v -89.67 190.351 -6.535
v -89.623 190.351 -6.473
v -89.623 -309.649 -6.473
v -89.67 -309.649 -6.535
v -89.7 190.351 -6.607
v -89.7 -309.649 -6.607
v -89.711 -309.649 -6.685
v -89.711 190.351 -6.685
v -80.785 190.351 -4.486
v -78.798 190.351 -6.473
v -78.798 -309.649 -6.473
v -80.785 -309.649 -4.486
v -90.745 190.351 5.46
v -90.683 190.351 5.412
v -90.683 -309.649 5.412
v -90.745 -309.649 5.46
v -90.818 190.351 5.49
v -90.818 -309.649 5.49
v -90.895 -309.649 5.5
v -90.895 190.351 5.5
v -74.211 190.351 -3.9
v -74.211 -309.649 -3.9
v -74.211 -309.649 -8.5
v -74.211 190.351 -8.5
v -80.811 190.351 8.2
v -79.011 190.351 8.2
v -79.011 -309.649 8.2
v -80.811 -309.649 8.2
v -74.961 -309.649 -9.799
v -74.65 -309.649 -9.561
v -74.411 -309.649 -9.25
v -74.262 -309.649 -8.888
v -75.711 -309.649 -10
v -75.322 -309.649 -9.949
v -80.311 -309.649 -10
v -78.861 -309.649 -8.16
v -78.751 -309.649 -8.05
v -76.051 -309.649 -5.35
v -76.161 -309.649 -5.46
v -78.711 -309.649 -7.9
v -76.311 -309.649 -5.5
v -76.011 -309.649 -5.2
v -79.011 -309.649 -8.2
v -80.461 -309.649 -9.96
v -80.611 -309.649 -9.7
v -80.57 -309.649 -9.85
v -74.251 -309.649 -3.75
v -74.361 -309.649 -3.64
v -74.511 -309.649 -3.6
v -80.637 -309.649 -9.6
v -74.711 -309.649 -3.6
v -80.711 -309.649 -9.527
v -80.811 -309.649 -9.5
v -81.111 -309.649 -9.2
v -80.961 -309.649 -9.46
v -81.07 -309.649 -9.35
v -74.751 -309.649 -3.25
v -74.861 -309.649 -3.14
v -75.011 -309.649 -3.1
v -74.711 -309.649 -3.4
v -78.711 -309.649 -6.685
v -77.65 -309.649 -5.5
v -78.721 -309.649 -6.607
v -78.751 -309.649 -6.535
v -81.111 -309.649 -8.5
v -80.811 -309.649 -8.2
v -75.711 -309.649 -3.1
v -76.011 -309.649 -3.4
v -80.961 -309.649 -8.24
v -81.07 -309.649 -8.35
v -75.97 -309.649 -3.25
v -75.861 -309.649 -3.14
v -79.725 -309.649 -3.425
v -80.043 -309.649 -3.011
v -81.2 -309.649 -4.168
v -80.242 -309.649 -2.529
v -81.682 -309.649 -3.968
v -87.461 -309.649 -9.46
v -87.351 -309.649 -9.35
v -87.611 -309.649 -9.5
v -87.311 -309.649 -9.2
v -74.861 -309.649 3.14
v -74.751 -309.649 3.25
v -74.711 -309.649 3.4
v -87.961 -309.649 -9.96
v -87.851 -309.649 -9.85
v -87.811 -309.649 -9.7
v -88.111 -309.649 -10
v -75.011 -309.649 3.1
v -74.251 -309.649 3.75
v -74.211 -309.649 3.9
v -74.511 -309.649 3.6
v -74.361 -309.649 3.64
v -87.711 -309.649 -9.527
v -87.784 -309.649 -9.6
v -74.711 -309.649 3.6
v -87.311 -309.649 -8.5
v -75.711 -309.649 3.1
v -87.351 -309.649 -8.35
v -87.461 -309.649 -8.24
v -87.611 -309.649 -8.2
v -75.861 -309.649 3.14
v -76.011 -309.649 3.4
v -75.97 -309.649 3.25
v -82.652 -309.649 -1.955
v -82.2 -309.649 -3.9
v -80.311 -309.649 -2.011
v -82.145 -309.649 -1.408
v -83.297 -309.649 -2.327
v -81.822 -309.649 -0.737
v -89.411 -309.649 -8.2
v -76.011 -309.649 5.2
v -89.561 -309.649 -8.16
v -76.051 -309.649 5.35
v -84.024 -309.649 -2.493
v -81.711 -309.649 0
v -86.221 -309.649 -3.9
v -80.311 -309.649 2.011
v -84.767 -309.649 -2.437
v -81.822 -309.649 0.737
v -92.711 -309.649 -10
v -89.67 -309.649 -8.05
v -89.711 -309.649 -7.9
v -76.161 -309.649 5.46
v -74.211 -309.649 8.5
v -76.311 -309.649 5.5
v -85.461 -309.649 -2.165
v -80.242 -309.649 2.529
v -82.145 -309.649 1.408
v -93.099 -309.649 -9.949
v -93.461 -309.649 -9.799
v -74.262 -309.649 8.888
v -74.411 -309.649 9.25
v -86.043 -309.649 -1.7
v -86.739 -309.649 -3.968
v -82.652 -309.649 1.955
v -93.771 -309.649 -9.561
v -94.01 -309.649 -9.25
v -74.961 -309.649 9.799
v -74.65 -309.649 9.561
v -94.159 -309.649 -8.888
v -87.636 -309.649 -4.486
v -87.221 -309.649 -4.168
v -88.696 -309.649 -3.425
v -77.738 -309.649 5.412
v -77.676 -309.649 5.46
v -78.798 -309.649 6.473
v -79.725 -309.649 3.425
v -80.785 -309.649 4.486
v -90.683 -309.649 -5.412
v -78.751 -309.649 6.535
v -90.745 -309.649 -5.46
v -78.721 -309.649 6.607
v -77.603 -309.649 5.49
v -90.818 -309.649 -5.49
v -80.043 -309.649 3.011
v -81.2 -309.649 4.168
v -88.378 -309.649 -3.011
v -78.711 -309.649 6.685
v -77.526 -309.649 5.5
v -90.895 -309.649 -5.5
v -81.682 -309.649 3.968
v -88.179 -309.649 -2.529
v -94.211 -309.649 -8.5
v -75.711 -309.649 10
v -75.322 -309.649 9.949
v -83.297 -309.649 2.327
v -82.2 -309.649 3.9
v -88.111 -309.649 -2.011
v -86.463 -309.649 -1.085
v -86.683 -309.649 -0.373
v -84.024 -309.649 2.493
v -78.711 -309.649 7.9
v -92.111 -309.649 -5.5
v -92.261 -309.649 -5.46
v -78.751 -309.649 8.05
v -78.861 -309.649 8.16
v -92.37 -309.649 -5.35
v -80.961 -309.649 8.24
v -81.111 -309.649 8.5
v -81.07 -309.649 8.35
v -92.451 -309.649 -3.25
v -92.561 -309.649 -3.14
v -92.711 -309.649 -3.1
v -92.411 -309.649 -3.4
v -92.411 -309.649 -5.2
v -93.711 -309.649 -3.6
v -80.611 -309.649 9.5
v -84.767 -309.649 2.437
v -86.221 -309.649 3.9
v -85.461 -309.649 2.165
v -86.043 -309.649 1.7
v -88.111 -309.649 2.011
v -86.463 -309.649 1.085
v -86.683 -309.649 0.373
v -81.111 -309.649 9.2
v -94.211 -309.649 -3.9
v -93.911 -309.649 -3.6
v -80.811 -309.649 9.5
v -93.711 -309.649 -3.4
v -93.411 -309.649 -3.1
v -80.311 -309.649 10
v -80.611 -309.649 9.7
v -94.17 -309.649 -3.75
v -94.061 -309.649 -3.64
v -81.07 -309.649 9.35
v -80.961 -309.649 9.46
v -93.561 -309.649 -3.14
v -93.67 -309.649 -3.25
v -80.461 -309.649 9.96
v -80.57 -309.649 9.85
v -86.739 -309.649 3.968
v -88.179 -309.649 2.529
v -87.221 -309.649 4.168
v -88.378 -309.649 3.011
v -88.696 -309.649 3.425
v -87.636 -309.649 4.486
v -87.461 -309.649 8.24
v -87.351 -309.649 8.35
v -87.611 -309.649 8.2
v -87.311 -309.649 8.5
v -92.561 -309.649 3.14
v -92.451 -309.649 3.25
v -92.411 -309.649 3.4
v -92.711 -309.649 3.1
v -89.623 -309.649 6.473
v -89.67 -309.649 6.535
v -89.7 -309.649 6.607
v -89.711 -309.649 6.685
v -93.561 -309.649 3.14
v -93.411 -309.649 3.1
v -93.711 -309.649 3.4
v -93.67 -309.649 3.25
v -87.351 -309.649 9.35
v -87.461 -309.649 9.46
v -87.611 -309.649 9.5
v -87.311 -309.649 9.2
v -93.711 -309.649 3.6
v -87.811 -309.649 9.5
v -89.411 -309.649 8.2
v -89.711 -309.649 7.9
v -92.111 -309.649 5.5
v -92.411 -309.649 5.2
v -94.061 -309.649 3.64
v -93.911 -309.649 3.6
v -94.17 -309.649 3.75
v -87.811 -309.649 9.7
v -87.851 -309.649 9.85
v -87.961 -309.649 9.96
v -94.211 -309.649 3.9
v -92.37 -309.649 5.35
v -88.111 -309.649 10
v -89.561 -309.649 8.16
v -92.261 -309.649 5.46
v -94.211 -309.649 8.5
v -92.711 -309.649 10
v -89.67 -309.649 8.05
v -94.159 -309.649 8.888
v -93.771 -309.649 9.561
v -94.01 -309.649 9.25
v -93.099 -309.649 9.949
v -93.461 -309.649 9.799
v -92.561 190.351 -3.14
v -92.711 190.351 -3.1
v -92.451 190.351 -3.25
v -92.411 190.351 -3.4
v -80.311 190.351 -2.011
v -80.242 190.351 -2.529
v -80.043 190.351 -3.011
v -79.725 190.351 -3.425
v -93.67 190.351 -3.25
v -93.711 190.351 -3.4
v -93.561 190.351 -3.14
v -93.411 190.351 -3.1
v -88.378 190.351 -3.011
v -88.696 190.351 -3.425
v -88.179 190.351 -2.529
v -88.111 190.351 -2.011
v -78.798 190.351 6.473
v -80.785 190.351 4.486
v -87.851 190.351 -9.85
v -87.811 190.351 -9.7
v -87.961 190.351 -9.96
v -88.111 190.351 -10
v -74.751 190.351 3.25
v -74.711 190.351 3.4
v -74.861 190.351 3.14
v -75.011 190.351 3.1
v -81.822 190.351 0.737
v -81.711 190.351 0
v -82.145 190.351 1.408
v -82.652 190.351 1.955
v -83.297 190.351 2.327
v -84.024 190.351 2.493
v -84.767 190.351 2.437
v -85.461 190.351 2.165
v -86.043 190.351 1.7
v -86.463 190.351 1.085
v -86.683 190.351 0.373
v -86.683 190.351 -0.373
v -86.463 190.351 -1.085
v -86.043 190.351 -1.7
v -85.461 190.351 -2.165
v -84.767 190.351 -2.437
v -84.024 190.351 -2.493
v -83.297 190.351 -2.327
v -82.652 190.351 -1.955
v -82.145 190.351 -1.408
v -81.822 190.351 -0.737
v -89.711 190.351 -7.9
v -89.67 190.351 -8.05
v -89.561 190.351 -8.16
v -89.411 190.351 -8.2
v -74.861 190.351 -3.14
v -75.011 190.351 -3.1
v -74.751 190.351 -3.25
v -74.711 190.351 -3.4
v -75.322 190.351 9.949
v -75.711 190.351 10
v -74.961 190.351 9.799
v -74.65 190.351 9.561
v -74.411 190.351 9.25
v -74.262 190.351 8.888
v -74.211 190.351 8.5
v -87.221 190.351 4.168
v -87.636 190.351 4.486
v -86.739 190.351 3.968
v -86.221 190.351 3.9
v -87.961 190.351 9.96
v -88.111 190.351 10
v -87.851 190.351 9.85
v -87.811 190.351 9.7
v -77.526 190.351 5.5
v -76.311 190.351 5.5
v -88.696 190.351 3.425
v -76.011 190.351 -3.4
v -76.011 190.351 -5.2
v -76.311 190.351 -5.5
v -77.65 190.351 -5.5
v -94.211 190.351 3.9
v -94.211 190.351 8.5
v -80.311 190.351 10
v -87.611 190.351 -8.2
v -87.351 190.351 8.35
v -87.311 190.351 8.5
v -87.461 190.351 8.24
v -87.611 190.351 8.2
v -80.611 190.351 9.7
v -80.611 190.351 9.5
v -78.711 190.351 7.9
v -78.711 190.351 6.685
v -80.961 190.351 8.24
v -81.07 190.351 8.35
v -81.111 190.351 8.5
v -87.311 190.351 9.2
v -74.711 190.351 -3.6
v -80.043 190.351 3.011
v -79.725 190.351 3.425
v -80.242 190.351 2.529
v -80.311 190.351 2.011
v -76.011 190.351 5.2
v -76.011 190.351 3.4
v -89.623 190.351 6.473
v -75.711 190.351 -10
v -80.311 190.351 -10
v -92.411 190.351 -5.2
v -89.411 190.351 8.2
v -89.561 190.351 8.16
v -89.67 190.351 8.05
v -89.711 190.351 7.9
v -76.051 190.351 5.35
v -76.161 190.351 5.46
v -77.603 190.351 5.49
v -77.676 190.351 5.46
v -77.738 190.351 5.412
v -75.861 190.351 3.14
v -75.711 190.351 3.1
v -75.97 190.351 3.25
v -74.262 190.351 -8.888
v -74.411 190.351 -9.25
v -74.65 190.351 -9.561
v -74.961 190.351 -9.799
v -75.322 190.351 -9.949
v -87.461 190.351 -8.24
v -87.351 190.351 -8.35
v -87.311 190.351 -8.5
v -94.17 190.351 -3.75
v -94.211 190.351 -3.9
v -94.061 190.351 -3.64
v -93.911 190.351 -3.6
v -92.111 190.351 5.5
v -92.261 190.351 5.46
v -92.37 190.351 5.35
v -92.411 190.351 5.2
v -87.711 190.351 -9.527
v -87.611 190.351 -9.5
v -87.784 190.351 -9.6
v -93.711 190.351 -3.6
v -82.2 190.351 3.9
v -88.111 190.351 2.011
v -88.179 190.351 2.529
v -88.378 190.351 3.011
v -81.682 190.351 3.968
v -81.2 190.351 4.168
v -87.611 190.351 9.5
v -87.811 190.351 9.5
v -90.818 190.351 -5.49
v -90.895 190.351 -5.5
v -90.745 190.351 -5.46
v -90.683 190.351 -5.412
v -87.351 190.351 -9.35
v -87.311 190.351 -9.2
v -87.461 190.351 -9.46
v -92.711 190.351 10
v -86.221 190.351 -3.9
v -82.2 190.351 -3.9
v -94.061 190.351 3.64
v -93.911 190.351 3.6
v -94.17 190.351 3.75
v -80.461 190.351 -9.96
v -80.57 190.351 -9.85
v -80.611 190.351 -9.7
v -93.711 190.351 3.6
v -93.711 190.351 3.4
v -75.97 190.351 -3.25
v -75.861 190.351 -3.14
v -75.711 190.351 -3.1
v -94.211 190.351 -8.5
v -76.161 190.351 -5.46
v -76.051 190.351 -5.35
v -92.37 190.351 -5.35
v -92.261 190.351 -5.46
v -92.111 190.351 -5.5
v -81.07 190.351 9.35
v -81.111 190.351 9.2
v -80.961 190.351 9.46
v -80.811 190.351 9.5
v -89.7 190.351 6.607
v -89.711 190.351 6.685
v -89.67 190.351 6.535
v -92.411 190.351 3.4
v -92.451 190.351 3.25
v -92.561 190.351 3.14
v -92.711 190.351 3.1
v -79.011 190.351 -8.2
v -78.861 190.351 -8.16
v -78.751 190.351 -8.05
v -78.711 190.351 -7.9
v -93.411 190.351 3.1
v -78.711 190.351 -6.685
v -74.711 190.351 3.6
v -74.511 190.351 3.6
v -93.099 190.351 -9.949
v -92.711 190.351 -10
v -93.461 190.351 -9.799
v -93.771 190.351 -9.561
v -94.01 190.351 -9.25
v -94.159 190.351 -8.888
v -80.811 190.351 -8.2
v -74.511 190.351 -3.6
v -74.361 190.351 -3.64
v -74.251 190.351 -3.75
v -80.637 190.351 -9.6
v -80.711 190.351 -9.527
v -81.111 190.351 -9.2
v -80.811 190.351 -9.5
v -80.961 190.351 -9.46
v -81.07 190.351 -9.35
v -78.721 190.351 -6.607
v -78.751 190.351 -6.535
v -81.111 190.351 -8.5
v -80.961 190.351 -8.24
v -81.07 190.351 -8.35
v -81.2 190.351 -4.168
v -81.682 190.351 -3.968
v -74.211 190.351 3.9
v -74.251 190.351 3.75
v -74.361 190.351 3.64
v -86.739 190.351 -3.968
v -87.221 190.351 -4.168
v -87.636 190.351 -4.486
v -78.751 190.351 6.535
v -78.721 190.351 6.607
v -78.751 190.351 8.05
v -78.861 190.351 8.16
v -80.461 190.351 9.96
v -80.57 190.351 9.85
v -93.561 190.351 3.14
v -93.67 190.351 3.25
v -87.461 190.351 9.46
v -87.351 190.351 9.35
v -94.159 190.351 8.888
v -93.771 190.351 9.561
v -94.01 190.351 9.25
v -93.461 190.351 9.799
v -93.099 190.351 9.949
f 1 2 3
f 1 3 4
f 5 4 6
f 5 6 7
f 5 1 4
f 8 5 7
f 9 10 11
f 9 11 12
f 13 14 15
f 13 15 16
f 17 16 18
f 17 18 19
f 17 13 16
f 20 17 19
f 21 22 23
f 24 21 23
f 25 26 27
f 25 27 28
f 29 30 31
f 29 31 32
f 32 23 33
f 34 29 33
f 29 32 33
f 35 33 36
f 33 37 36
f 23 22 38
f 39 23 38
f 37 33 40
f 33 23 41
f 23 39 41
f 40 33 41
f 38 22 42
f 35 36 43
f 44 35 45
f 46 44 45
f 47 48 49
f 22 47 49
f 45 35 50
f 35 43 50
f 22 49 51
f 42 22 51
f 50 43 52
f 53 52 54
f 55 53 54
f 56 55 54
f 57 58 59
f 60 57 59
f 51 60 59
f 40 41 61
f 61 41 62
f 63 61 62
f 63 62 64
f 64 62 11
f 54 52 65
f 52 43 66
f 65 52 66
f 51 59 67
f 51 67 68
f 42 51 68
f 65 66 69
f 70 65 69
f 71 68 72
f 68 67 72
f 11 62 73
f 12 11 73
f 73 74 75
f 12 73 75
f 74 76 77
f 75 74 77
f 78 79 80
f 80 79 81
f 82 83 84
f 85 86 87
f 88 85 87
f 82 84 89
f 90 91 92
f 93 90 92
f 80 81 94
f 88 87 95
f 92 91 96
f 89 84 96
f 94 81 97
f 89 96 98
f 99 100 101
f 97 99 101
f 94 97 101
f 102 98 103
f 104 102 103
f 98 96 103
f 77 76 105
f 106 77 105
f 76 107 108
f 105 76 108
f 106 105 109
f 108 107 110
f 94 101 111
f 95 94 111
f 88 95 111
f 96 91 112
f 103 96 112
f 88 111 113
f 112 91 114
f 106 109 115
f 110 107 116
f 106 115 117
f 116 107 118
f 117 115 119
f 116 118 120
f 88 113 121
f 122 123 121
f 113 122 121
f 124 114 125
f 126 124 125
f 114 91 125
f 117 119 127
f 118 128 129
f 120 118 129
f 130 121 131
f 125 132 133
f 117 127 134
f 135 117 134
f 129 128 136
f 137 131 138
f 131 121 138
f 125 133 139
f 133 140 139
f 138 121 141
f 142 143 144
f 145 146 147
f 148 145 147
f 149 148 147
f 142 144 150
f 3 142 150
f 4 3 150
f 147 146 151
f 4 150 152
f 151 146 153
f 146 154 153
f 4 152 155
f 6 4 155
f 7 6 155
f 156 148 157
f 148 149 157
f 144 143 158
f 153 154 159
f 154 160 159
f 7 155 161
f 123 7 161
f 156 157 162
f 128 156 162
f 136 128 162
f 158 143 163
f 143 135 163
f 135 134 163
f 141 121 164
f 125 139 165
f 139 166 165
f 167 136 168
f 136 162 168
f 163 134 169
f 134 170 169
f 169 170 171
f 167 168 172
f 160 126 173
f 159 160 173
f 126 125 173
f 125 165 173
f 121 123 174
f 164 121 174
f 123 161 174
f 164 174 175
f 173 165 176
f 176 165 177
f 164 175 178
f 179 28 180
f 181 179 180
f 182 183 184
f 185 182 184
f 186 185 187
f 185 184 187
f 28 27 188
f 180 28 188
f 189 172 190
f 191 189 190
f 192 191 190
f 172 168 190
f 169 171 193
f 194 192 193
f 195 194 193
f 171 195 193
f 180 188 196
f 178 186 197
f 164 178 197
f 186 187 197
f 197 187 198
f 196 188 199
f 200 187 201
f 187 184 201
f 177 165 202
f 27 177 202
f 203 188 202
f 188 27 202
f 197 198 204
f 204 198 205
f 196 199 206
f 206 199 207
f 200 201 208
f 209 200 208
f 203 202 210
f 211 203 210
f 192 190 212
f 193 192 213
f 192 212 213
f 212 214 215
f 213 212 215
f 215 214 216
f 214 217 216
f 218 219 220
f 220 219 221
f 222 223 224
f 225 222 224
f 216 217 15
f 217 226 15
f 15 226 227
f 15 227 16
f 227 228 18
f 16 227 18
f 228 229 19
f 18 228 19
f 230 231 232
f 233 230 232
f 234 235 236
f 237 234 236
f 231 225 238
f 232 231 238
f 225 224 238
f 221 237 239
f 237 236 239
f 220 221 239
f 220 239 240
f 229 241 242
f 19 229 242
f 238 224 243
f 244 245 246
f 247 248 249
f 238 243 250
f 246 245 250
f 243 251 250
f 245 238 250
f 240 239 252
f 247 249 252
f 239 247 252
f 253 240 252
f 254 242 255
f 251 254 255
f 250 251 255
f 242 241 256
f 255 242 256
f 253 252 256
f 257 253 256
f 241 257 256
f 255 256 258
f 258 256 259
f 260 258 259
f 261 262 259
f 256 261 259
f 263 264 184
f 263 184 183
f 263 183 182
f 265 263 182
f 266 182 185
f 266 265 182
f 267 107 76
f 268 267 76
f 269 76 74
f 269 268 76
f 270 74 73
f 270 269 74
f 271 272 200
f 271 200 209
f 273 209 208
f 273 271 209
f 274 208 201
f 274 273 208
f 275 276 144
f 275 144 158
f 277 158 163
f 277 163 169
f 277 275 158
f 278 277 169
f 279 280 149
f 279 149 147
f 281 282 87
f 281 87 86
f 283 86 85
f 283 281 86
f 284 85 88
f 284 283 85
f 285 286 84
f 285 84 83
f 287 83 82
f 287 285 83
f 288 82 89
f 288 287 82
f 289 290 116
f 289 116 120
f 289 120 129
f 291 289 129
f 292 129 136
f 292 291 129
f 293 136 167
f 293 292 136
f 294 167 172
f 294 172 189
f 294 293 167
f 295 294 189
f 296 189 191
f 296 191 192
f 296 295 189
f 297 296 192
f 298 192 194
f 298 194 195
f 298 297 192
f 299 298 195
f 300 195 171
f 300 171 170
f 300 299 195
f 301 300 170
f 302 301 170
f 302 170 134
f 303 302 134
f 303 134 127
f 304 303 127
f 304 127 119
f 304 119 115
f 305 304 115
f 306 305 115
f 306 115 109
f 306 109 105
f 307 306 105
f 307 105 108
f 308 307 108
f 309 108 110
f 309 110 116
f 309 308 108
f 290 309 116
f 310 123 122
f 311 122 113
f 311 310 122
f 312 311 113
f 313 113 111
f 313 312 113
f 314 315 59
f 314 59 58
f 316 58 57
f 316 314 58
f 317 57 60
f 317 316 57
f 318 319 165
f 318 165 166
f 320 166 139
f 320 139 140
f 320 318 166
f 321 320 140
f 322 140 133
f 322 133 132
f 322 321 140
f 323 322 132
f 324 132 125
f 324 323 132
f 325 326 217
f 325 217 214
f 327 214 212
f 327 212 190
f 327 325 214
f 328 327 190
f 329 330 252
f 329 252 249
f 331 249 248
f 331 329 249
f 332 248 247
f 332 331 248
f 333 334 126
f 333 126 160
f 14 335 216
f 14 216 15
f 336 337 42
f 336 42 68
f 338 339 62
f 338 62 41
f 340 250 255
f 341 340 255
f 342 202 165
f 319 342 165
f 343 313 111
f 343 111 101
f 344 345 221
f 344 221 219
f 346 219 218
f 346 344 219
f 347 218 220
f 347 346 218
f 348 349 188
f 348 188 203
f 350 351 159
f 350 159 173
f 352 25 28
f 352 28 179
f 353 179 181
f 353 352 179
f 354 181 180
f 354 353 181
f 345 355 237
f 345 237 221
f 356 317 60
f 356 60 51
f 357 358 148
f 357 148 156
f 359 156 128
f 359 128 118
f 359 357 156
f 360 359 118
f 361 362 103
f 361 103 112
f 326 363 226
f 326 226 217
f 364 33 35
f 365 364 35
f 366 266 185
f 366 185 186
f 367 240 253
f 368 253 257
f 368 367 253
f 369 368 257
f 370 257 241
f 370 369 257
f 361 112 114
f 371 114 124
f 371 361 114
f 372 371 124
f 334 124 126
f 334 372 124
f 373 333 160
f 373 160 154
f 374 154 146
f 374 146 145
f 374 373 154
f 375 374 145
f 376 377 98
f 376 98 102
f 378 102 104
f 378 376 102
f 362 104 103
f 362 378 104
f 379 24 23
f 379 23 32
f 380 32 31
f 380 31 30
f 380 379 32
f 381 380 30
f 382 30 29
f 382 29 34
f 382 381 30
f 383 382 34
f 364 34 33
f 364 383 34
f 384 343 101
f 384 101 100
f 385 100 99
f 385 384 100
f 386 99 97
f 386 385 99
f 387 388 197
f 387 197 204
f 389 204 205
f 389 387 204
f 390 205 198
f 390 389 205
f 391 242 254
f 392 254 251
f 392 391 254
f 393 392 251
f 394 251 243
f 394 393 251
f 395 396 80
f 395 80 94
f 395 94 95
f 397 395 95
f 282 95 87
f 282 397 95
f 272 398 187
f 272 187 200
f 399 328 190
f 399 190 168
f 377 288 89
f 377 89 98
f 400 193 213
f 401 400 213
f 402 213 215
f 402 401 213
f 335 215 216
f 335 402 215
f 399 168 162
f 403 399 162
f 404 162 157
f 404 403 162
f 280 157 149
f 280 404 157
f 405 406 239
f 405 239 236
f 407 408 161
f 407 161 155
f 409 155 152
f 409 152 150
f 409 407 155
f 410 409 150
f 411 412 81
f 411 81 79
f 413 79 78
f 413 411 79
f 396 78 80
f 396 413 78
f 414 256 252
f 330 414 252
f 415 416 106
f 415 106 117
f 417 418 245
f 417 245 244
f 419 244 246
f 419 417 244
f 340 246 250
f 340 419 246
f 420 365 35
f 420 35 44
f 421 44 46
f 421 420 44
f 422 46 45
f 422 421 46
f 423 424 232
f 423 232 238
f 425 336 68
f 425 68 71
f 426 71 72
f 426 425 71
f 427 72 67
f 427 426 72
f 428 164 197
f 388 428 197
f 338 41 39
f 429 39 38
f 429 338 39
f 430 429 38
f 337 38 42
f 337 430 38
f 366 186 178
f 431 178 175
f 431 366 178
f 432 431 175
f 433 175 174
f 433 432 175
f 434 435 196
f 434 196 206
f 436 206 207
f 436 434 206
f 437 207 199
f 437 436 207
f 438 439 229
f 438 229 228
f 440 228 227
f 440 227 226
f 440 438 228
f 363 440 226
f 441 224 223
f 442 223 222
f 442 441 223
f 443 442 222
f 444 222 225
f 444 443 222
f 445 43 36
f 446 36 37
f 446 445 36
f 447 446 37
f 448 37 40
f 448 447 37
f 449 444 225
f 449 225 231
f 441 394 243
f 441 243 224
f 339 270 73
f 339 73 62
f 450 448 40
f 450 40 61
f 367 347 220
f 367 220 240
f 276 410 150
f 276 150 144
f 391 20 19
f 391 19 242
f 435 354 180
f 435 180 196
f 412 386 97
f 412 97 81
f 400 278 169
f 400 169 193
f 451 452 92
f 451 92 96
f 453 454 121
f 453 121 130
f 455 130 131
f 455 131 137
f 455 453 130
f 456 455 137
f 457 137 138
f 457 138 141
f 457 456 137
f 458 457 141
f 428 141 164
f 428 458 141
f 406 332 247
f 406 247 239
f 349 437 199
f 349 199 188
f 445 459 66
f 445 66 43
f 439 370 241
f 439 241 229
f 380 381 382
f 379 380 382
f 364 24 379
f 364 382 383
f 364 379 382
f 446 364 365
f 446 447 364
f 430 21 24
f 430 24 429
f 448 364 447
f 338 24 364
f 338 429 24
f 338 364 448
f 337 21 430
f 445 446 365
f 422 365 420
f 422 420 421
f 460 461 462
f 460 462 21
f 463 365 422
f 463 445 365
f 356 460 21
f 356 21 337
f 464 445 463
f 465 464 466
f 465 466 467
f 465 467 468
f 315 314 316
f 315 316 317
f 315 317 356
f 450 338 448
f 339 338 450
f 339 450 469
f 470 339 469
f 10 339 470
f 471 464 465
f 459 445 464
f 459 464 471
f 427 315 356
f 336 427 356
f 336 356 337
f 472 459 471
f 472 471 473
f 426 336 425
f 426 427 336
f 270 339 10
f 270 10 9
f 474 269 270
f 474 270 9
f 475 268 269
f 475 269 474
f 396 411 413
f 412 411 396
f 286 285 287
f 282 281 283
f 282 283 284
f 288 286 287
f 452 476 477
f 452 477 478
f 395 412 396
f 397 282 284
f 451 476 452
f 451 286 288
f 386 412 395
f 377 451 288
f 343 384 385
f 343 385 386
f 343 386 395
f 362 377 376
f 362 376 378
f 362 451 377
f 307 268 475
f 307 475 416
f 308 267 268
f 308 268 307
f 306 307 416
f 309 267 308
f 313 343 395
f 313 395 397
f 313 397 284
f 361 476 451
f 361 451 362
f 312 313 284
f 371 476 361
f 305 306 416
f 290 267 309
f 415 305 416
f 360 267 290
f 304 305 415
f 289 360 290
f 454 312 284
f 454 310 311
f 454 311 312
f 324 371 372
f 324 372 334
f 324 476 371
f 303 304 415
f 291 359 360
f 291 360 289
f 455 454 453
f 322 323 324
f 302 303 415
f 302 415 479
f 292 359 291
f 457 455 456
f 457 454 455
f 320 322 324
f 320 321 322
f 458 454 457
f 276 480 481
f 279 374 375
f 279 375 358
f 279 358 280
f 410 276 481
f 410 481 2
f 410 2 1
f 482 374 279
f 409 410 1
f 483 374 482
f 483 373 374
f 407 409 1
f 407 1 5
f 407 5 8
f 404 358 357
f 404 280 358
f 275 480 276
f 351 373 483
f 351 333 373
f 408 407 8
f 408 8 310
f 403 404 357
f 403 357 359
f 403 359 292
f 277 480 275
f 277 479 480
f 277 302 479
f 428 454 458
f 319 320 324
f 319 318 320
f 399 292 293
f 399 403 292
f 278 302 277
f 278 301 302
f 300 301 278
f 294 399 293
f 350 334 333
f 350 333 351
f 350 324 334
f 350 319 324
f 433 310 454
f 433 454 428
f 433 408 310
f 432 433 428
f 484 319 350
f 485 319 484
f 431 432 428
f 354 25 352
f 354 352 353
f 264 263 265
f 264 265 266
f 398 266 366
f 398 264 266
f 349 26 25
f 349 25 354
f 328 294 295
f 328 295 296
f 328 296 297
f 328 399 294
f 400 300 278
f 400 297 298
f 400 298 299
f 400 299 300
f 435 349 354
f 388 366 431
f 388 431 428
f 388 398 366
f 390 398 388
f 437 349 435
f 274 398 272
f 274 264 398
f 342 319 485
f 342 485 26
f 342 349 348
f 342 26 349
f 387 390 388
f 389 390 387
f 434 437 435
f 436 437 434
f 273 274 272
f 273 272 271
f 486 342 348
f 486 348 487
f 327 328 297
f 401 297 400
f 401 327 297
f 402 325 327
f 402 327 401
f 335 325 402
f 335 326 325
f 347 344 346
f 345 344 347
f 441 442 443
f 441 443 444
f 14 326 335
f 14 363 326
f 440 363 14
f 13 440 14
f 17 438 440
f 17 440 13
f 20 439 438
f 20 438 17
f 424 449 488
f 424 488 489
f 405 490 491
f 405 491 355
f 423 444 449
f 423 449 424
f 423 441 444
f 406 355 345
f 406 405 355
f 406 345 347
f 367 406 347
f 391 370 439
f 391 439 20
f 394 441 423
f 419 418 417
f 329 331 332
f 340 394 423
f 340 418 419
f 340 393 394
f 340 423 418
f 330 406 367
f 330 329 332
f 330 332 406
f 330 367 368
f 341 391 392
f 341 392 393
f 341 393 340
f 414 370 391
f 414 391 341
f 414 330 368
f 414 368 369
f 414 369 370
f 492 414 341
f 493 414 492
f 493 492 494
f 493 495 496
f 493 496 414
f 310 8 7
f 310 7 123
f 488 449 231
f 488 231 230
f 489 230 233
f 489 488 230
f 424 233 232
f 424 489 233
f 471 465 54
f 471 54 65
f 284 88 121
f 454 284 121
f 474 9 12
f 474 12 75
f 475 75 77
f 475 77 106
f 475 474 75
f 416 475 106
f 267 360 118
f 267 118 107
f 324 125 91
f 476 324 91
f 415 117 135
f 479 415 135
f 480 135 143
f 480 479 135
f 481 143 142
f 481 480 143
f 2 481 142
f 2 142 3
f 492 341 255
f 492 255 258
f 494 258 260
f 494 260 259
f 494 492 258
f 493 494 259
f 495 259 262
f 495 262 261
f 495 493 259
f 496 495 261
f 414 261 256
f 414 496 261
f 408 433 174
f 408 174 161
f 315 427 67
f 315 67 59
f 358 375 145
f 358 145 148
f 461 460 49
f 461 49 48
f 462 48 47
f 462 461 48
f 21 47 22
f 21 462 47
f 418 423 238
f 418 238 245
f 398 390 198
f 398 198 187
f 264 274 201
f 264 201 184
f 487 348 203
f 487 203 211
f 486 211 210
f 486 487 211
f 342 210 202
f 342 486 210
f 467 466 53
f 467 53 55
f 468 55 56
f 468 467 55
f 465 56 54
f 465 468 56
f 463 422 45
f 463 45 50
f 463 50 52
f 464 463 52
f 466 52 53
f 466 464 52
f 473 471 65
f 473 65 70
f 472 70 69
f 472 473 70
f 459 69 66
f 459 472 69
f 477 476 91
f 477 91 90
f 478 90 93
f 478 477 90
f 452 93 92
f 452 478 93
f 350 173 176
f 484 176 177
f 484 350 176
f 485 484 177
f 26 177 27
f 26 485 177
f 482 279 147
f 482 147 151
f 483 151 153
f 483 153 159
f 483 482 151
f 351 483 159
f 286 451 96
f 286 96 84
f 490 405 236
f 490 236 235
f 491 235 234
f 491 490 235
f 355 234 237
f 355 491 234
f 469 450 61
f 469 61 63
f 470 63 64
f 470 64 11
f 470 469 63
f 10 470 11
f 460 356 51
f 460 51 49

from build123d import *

# Parameters (mm, degrees)
SKETCH_11_R            = 2.5
MEMBER_20_2020_1_DEPTH = 500


with BuildPart() as part:
    # 草图11 → Member 20 2020_1 (new body)
    with BuildSketch(Plane(origin=(-84.210526316, 190.350877193, 0), x_dir=(1, 0, 0), z_dir=(0, -1, 0))):
        with BuildLine():
            Line((3.9, 0), (3.9, -2.010912703))
            ThreePointArc((3.9, -2.010912703), (4.052240935, -2.776279568), (4.485786438, -3.425126266))
            Line((4.485786438, -3.425126266), (6.560660172, -5.5))
            Line((6.560660172, -5.5), (7.9, -5.5))
            ThreePointArc((7.9, -5.5), (8.112132034, -5.412132034), (8.2, -5.2))
            Line((8.2, -5.2), (8.2, -3.4))
            ThreePointArc((8.2, -3.4), (8.287867966, -3.187867966), (8.5, -3.1))
            Line((8.5, -3.1), (9.2, -3.1))
            ThreePointArc((9.2, -3.1), (9.412132034, -3.187867966), (9.5, -3.4))
            Line((9.5, -3.4), (9.5, -3.6))
            Line((9.5, -3.6), (9.7, -3.6))
            ThreePointArc((9.7, -3.6), (9.912132034, -3.687867966), (10, -3.9))
            Line((10, -3.9), (10, -8.5))
            ThreePointArc((10, -8.5), (9.560660172, -9.560660172), (8.5, -10))
            Line((8.5, -10), (3.9, -10))
            ThreePointArc((3.9, -10), (3.687867966, -9.912132034), (3.6, -9.7))
            ThreePointArc((3.6, -9.7), (3.541421356, -9.558578644), (3.4, -9.5))
            ThreePointArc((3.4, -9.5), (3.187867966, -9.412132034), (3.1, -9.2))
            Line((3.1, -9.2), (3.1, -8.5))
            ThreePointArc((3.1, -8.5), (3.187867966, -8.287867966), (3.4, -8.2))
            Line((3.4, -8.2), (5.2, -8.2))
            ThreePointArc((5.2, -8.2), (5.412132034, -8.112132034), (5.5, -7.9))
            Line((5.5, -7.9), (5.5, -6.68492424))
            ThreePointArc((5.5, -6.68492424), (5.47716386, -6.570119211), (5.412132034, -6.472792206))
            Line((5.412132034, -6.472792206), (3.425126266, -4.485786438))
            ThreePointArc((3.425126266, -4.485786438), (2.776279568, -4.052240935), (2.010912703, -3.9))
            Line((2.010912703, -3.9), (0, -3.9))
            Line((0, -3.9), (-2.010912703, -3.9))
            ThreePointArc((-2.010912703, -3.9), (-2.776279568, -4.052240935), (-3.425126266, -4.485786438))
            Line((-3.425126266, -4.485786438), (-5.412132034, -6.472792206))
            ThreePointArc((-5.412132034, -6.472792206), (-5.47716386, -6.570119211), (-5.5, -6.68492424))
            Line((-5.5, -6.68492424), (-5.5, -7.9))
            ThreePointArc((-5.5, -7.9), (-5.412132034, -8.112132034), (-5.2, -8.2))
            Line((-5.2, -8.2), (-3.4, -8.2))
            ThreePointArc((-3.4, -8.2), (-3.187867966, -8.287867966), (-3.1, -8.5))
            Line((-3.1, -8.5), (-3.1, -9.2))
            ThreePointArc((-3.1, -9.2), (-3.187867966, -9.412132034), (-3.4, -9.5))
            ThreePointArc((-3.4, -9.5), (-3.541421356, -9.558578644), (-3.6, -9.7))
            ThreePointArc((-3.6, -9.7), (-3.687867966, -9.912132034), (-3.9, -10))
            Line((-3.9, -10), (-8.5, -10))
            ThreePointArc((-8.5, -10), (-9.560660172, -9.560660172), (-10, -8.5))
            Line((-10, -8.5), (-10, -3.9))
            ThreePointArc((-10, -3.9), (-9.912132034, -3.687867966), (-9.7, -3.6))
            Line((-9.7, -3.6), (-9.5, -3.6))
            Line((-9.5, -3.6), (-9.5, -3.4))
            ThreePointArc((-9.5, -3.4), (-9.412132034, -3.187867966), (-9.2, -3.1))
            Line((-9.2, -3.1), (-8.5, -3.1))
            ThreePointArc((-8.5, -3.1), (-8.287867965, -3.187867966), (-8.2, -3.4))
            Line((-8.2, -3.4), (-8.2, -5.2))
            ThreePointArc((-8.2, -5.2), (-8.112132034, -5.412132034), (-7.9, -5.5))
            Line((-7.9, -5.5), (-6.68492424, -5.5))
            ThreePointArc((-6.68492424, -5.5), (-6.570119211, -5.47716386), (-6.472792206, -5.412132034))
            Line((-6.472792206, -5.412132034), (-4.485786438, -3.425126266))
            ThreePointArc((-4.485786438, -3.425126266), (-4.052240935, -2.776279568), (-3.9, -2.010912703))
            Line((-3.9, -2.010912703), (-3.9, 0))
            Line((-3.9, 0), (-3.9, 2.010912703))
            ThreePointArc((-3.9, 2.010912703), (-4.052240935, 2.776279568), (-4.485786438, 3.425126266))
            Line((-4.485786438, 3.425126266), (-6.472792206, 5.412132034))
            ThreePointArc((-6.472792206, 5.412132034), (-6.570119211, 5.47716386), (-6.68492424, 5.5))
            Line((-6.68492424, 5.5), (-7.9, 5.5))
            ThreePointArc((-7.9, 5.5), (-8.112132034, 5.412132034), (-8.2, 5.2))
            Line((-8.2, 5.2), (-8.2, 3.4))
            ThreePointArc((-8.2, 3.4), (-8.287867965, 3.187867966), (-8.5, 3.1))
            Line((-8.5, 3.1), (-9.2, 3.1))
            ThreePointArc((-9.2, 3.1), (-9.412132034, 3.187867966), (-9.5, 3.4))
            Line((-9.5, 3.4), (-9.5, 3.6))
            Line((-9.5, 3.6), (-9.7, 3.6))
            ThreePointArc((-9.7, 3.6), (-9.912132034, 3.687867966), (-10, 3.9))
            Line((-10, 3.9), (-10, 8.5))
            ThreePointArc((-10, 8.5), (-9.560660172, 9.560660172), (-8.5, 10))
            Line((-8.5, 10), (-3.9, 10))
            ThreePointArc((-3.9, 10), (-3.687867966, 9.912132034), (-3.6, 9.7))
            Line((-3.6, 9.7), (-3.6, 9.5))
            Line((-3.6, 9.5), (-3.4, 9.5))
            ThreePointArc((-3.4, 9.5), (-3.187867966, 9.412132034), (-3.1, 9.2))
            Line((-3.1, 9.2), (-3.1, 8.5))
            ThreePointArc((-3.1, 8.5), (-3.187867966, 8.287867966), (-3.4, 8.2))
            Line((-3.4, 8.2), (-5.2, 8.2))
            ThreePointArc((-5.2, 8.2), (-5.412132034, 8.112132034), (-5.5, 7.9))
            Line((-5.5, 7.9), (-5.5, 6.68492424))
            ThreePointArc((-5.5, 6.68492424), (-5.47716386, 6.570119211), (-5.412132034, 6.472792206))
            Line((-5.412132034, 6.472792206), (-3.425126266, 4.485786438))
            ThreePointArc((-3.425126266, 4.485786438), (-2.776279568, 4.052240935), (-2.010912703, 3.9))
            Line((-2.010912703, 3.9), (0, 3.9))
            Line((0, 3.9), (2.010912703, 3.9))
            ThreePointArc((2.010912703, 3.9), (2.776279568, 4.052240935), (3.425126266, 4.485786438))
            Line((3.425126266, 4.485786438), (5.412132034, 6.472792206))
            ThreePointArc((5.412132034, 6.472792206), (5.47716386, 6.570119211), (5.5, 6.68492424))
            Line((5.5, 6.68492424), (5.5, 7.9))
            ThreePointArc((5.5, 7.9), (5.412132034, 8.112132034), (5.2, 8.2))
            Line((5.2, 8.2), (3.4, 8.2))
            ThreePointArc((3.4, 8.2), (3.187867966, 8.287867966), (3.1, 8.5))
            Line((3.1, 8.5), (3.1, 9.2))
            ThreePointArc((3.1, 9.2), (3.187867966, 9.412132034), (3.4, 9.5))
            Line((3.4, 9.5), (3.6, 9.5))
            Line((3.6, 9.5), (3.6, 9.7))
            ThreePointArc((3.6, 9.7), (3.687867966, 9.912132034), (3.9, 10))
            Line((3.9, 10), (8.5, 10))
            ThreePointArc((8.5, 10), (9.560660172, 9.560660172), (10, 8.5))
            Line((10, 8.5), (10, 3.9))
            ThreePointArc((10, 3.9), (9.912132034, 3.687867966), (9.7, 3.6))
            Line((9.7, 3.6), (9.5, 3.6))
            Line((9.5, 3.6), (9.5, 3.4))
            ThreePointArc((9.5, 3.4), (9.412132034, 3.187867966), (9.2, 3.1))
            Line((9.2, 3.1), (8.5, 3.1))
            ThreePointArc((8.5, 3.1), (8.287867966, 3.187867966), (8.2, 3.4))
            Line((8.2, 3.4), (8.2, 5.2))
            ThreePointArc((8.2, 5.2), (8.112132034, 5.412132034), (7.9, 5.5))
            Line((7.9, 5.5), (6.68492424, 5.5))
            ThreePointArc((6.68492424, 5.5), (6.570119211, 5.47716386), (6.472792206, 5.412132034))
            Line((6.472792206, 5.412132034), (4.485786438, 3.425126266))
            ThreePointArc((4.485786438, 3.425126266), (4.052240935, 2.776279568), (3.9, 2.010912703))
            Line((3.9, 2.010912703), (3.9, 0))
        make_face()
        Circle(SKETCH_11_R, mode=Mode.SUBTRACT)
    extrude(amount=MEMBER_20_2020_1_DEPTH)


solid = part.part
